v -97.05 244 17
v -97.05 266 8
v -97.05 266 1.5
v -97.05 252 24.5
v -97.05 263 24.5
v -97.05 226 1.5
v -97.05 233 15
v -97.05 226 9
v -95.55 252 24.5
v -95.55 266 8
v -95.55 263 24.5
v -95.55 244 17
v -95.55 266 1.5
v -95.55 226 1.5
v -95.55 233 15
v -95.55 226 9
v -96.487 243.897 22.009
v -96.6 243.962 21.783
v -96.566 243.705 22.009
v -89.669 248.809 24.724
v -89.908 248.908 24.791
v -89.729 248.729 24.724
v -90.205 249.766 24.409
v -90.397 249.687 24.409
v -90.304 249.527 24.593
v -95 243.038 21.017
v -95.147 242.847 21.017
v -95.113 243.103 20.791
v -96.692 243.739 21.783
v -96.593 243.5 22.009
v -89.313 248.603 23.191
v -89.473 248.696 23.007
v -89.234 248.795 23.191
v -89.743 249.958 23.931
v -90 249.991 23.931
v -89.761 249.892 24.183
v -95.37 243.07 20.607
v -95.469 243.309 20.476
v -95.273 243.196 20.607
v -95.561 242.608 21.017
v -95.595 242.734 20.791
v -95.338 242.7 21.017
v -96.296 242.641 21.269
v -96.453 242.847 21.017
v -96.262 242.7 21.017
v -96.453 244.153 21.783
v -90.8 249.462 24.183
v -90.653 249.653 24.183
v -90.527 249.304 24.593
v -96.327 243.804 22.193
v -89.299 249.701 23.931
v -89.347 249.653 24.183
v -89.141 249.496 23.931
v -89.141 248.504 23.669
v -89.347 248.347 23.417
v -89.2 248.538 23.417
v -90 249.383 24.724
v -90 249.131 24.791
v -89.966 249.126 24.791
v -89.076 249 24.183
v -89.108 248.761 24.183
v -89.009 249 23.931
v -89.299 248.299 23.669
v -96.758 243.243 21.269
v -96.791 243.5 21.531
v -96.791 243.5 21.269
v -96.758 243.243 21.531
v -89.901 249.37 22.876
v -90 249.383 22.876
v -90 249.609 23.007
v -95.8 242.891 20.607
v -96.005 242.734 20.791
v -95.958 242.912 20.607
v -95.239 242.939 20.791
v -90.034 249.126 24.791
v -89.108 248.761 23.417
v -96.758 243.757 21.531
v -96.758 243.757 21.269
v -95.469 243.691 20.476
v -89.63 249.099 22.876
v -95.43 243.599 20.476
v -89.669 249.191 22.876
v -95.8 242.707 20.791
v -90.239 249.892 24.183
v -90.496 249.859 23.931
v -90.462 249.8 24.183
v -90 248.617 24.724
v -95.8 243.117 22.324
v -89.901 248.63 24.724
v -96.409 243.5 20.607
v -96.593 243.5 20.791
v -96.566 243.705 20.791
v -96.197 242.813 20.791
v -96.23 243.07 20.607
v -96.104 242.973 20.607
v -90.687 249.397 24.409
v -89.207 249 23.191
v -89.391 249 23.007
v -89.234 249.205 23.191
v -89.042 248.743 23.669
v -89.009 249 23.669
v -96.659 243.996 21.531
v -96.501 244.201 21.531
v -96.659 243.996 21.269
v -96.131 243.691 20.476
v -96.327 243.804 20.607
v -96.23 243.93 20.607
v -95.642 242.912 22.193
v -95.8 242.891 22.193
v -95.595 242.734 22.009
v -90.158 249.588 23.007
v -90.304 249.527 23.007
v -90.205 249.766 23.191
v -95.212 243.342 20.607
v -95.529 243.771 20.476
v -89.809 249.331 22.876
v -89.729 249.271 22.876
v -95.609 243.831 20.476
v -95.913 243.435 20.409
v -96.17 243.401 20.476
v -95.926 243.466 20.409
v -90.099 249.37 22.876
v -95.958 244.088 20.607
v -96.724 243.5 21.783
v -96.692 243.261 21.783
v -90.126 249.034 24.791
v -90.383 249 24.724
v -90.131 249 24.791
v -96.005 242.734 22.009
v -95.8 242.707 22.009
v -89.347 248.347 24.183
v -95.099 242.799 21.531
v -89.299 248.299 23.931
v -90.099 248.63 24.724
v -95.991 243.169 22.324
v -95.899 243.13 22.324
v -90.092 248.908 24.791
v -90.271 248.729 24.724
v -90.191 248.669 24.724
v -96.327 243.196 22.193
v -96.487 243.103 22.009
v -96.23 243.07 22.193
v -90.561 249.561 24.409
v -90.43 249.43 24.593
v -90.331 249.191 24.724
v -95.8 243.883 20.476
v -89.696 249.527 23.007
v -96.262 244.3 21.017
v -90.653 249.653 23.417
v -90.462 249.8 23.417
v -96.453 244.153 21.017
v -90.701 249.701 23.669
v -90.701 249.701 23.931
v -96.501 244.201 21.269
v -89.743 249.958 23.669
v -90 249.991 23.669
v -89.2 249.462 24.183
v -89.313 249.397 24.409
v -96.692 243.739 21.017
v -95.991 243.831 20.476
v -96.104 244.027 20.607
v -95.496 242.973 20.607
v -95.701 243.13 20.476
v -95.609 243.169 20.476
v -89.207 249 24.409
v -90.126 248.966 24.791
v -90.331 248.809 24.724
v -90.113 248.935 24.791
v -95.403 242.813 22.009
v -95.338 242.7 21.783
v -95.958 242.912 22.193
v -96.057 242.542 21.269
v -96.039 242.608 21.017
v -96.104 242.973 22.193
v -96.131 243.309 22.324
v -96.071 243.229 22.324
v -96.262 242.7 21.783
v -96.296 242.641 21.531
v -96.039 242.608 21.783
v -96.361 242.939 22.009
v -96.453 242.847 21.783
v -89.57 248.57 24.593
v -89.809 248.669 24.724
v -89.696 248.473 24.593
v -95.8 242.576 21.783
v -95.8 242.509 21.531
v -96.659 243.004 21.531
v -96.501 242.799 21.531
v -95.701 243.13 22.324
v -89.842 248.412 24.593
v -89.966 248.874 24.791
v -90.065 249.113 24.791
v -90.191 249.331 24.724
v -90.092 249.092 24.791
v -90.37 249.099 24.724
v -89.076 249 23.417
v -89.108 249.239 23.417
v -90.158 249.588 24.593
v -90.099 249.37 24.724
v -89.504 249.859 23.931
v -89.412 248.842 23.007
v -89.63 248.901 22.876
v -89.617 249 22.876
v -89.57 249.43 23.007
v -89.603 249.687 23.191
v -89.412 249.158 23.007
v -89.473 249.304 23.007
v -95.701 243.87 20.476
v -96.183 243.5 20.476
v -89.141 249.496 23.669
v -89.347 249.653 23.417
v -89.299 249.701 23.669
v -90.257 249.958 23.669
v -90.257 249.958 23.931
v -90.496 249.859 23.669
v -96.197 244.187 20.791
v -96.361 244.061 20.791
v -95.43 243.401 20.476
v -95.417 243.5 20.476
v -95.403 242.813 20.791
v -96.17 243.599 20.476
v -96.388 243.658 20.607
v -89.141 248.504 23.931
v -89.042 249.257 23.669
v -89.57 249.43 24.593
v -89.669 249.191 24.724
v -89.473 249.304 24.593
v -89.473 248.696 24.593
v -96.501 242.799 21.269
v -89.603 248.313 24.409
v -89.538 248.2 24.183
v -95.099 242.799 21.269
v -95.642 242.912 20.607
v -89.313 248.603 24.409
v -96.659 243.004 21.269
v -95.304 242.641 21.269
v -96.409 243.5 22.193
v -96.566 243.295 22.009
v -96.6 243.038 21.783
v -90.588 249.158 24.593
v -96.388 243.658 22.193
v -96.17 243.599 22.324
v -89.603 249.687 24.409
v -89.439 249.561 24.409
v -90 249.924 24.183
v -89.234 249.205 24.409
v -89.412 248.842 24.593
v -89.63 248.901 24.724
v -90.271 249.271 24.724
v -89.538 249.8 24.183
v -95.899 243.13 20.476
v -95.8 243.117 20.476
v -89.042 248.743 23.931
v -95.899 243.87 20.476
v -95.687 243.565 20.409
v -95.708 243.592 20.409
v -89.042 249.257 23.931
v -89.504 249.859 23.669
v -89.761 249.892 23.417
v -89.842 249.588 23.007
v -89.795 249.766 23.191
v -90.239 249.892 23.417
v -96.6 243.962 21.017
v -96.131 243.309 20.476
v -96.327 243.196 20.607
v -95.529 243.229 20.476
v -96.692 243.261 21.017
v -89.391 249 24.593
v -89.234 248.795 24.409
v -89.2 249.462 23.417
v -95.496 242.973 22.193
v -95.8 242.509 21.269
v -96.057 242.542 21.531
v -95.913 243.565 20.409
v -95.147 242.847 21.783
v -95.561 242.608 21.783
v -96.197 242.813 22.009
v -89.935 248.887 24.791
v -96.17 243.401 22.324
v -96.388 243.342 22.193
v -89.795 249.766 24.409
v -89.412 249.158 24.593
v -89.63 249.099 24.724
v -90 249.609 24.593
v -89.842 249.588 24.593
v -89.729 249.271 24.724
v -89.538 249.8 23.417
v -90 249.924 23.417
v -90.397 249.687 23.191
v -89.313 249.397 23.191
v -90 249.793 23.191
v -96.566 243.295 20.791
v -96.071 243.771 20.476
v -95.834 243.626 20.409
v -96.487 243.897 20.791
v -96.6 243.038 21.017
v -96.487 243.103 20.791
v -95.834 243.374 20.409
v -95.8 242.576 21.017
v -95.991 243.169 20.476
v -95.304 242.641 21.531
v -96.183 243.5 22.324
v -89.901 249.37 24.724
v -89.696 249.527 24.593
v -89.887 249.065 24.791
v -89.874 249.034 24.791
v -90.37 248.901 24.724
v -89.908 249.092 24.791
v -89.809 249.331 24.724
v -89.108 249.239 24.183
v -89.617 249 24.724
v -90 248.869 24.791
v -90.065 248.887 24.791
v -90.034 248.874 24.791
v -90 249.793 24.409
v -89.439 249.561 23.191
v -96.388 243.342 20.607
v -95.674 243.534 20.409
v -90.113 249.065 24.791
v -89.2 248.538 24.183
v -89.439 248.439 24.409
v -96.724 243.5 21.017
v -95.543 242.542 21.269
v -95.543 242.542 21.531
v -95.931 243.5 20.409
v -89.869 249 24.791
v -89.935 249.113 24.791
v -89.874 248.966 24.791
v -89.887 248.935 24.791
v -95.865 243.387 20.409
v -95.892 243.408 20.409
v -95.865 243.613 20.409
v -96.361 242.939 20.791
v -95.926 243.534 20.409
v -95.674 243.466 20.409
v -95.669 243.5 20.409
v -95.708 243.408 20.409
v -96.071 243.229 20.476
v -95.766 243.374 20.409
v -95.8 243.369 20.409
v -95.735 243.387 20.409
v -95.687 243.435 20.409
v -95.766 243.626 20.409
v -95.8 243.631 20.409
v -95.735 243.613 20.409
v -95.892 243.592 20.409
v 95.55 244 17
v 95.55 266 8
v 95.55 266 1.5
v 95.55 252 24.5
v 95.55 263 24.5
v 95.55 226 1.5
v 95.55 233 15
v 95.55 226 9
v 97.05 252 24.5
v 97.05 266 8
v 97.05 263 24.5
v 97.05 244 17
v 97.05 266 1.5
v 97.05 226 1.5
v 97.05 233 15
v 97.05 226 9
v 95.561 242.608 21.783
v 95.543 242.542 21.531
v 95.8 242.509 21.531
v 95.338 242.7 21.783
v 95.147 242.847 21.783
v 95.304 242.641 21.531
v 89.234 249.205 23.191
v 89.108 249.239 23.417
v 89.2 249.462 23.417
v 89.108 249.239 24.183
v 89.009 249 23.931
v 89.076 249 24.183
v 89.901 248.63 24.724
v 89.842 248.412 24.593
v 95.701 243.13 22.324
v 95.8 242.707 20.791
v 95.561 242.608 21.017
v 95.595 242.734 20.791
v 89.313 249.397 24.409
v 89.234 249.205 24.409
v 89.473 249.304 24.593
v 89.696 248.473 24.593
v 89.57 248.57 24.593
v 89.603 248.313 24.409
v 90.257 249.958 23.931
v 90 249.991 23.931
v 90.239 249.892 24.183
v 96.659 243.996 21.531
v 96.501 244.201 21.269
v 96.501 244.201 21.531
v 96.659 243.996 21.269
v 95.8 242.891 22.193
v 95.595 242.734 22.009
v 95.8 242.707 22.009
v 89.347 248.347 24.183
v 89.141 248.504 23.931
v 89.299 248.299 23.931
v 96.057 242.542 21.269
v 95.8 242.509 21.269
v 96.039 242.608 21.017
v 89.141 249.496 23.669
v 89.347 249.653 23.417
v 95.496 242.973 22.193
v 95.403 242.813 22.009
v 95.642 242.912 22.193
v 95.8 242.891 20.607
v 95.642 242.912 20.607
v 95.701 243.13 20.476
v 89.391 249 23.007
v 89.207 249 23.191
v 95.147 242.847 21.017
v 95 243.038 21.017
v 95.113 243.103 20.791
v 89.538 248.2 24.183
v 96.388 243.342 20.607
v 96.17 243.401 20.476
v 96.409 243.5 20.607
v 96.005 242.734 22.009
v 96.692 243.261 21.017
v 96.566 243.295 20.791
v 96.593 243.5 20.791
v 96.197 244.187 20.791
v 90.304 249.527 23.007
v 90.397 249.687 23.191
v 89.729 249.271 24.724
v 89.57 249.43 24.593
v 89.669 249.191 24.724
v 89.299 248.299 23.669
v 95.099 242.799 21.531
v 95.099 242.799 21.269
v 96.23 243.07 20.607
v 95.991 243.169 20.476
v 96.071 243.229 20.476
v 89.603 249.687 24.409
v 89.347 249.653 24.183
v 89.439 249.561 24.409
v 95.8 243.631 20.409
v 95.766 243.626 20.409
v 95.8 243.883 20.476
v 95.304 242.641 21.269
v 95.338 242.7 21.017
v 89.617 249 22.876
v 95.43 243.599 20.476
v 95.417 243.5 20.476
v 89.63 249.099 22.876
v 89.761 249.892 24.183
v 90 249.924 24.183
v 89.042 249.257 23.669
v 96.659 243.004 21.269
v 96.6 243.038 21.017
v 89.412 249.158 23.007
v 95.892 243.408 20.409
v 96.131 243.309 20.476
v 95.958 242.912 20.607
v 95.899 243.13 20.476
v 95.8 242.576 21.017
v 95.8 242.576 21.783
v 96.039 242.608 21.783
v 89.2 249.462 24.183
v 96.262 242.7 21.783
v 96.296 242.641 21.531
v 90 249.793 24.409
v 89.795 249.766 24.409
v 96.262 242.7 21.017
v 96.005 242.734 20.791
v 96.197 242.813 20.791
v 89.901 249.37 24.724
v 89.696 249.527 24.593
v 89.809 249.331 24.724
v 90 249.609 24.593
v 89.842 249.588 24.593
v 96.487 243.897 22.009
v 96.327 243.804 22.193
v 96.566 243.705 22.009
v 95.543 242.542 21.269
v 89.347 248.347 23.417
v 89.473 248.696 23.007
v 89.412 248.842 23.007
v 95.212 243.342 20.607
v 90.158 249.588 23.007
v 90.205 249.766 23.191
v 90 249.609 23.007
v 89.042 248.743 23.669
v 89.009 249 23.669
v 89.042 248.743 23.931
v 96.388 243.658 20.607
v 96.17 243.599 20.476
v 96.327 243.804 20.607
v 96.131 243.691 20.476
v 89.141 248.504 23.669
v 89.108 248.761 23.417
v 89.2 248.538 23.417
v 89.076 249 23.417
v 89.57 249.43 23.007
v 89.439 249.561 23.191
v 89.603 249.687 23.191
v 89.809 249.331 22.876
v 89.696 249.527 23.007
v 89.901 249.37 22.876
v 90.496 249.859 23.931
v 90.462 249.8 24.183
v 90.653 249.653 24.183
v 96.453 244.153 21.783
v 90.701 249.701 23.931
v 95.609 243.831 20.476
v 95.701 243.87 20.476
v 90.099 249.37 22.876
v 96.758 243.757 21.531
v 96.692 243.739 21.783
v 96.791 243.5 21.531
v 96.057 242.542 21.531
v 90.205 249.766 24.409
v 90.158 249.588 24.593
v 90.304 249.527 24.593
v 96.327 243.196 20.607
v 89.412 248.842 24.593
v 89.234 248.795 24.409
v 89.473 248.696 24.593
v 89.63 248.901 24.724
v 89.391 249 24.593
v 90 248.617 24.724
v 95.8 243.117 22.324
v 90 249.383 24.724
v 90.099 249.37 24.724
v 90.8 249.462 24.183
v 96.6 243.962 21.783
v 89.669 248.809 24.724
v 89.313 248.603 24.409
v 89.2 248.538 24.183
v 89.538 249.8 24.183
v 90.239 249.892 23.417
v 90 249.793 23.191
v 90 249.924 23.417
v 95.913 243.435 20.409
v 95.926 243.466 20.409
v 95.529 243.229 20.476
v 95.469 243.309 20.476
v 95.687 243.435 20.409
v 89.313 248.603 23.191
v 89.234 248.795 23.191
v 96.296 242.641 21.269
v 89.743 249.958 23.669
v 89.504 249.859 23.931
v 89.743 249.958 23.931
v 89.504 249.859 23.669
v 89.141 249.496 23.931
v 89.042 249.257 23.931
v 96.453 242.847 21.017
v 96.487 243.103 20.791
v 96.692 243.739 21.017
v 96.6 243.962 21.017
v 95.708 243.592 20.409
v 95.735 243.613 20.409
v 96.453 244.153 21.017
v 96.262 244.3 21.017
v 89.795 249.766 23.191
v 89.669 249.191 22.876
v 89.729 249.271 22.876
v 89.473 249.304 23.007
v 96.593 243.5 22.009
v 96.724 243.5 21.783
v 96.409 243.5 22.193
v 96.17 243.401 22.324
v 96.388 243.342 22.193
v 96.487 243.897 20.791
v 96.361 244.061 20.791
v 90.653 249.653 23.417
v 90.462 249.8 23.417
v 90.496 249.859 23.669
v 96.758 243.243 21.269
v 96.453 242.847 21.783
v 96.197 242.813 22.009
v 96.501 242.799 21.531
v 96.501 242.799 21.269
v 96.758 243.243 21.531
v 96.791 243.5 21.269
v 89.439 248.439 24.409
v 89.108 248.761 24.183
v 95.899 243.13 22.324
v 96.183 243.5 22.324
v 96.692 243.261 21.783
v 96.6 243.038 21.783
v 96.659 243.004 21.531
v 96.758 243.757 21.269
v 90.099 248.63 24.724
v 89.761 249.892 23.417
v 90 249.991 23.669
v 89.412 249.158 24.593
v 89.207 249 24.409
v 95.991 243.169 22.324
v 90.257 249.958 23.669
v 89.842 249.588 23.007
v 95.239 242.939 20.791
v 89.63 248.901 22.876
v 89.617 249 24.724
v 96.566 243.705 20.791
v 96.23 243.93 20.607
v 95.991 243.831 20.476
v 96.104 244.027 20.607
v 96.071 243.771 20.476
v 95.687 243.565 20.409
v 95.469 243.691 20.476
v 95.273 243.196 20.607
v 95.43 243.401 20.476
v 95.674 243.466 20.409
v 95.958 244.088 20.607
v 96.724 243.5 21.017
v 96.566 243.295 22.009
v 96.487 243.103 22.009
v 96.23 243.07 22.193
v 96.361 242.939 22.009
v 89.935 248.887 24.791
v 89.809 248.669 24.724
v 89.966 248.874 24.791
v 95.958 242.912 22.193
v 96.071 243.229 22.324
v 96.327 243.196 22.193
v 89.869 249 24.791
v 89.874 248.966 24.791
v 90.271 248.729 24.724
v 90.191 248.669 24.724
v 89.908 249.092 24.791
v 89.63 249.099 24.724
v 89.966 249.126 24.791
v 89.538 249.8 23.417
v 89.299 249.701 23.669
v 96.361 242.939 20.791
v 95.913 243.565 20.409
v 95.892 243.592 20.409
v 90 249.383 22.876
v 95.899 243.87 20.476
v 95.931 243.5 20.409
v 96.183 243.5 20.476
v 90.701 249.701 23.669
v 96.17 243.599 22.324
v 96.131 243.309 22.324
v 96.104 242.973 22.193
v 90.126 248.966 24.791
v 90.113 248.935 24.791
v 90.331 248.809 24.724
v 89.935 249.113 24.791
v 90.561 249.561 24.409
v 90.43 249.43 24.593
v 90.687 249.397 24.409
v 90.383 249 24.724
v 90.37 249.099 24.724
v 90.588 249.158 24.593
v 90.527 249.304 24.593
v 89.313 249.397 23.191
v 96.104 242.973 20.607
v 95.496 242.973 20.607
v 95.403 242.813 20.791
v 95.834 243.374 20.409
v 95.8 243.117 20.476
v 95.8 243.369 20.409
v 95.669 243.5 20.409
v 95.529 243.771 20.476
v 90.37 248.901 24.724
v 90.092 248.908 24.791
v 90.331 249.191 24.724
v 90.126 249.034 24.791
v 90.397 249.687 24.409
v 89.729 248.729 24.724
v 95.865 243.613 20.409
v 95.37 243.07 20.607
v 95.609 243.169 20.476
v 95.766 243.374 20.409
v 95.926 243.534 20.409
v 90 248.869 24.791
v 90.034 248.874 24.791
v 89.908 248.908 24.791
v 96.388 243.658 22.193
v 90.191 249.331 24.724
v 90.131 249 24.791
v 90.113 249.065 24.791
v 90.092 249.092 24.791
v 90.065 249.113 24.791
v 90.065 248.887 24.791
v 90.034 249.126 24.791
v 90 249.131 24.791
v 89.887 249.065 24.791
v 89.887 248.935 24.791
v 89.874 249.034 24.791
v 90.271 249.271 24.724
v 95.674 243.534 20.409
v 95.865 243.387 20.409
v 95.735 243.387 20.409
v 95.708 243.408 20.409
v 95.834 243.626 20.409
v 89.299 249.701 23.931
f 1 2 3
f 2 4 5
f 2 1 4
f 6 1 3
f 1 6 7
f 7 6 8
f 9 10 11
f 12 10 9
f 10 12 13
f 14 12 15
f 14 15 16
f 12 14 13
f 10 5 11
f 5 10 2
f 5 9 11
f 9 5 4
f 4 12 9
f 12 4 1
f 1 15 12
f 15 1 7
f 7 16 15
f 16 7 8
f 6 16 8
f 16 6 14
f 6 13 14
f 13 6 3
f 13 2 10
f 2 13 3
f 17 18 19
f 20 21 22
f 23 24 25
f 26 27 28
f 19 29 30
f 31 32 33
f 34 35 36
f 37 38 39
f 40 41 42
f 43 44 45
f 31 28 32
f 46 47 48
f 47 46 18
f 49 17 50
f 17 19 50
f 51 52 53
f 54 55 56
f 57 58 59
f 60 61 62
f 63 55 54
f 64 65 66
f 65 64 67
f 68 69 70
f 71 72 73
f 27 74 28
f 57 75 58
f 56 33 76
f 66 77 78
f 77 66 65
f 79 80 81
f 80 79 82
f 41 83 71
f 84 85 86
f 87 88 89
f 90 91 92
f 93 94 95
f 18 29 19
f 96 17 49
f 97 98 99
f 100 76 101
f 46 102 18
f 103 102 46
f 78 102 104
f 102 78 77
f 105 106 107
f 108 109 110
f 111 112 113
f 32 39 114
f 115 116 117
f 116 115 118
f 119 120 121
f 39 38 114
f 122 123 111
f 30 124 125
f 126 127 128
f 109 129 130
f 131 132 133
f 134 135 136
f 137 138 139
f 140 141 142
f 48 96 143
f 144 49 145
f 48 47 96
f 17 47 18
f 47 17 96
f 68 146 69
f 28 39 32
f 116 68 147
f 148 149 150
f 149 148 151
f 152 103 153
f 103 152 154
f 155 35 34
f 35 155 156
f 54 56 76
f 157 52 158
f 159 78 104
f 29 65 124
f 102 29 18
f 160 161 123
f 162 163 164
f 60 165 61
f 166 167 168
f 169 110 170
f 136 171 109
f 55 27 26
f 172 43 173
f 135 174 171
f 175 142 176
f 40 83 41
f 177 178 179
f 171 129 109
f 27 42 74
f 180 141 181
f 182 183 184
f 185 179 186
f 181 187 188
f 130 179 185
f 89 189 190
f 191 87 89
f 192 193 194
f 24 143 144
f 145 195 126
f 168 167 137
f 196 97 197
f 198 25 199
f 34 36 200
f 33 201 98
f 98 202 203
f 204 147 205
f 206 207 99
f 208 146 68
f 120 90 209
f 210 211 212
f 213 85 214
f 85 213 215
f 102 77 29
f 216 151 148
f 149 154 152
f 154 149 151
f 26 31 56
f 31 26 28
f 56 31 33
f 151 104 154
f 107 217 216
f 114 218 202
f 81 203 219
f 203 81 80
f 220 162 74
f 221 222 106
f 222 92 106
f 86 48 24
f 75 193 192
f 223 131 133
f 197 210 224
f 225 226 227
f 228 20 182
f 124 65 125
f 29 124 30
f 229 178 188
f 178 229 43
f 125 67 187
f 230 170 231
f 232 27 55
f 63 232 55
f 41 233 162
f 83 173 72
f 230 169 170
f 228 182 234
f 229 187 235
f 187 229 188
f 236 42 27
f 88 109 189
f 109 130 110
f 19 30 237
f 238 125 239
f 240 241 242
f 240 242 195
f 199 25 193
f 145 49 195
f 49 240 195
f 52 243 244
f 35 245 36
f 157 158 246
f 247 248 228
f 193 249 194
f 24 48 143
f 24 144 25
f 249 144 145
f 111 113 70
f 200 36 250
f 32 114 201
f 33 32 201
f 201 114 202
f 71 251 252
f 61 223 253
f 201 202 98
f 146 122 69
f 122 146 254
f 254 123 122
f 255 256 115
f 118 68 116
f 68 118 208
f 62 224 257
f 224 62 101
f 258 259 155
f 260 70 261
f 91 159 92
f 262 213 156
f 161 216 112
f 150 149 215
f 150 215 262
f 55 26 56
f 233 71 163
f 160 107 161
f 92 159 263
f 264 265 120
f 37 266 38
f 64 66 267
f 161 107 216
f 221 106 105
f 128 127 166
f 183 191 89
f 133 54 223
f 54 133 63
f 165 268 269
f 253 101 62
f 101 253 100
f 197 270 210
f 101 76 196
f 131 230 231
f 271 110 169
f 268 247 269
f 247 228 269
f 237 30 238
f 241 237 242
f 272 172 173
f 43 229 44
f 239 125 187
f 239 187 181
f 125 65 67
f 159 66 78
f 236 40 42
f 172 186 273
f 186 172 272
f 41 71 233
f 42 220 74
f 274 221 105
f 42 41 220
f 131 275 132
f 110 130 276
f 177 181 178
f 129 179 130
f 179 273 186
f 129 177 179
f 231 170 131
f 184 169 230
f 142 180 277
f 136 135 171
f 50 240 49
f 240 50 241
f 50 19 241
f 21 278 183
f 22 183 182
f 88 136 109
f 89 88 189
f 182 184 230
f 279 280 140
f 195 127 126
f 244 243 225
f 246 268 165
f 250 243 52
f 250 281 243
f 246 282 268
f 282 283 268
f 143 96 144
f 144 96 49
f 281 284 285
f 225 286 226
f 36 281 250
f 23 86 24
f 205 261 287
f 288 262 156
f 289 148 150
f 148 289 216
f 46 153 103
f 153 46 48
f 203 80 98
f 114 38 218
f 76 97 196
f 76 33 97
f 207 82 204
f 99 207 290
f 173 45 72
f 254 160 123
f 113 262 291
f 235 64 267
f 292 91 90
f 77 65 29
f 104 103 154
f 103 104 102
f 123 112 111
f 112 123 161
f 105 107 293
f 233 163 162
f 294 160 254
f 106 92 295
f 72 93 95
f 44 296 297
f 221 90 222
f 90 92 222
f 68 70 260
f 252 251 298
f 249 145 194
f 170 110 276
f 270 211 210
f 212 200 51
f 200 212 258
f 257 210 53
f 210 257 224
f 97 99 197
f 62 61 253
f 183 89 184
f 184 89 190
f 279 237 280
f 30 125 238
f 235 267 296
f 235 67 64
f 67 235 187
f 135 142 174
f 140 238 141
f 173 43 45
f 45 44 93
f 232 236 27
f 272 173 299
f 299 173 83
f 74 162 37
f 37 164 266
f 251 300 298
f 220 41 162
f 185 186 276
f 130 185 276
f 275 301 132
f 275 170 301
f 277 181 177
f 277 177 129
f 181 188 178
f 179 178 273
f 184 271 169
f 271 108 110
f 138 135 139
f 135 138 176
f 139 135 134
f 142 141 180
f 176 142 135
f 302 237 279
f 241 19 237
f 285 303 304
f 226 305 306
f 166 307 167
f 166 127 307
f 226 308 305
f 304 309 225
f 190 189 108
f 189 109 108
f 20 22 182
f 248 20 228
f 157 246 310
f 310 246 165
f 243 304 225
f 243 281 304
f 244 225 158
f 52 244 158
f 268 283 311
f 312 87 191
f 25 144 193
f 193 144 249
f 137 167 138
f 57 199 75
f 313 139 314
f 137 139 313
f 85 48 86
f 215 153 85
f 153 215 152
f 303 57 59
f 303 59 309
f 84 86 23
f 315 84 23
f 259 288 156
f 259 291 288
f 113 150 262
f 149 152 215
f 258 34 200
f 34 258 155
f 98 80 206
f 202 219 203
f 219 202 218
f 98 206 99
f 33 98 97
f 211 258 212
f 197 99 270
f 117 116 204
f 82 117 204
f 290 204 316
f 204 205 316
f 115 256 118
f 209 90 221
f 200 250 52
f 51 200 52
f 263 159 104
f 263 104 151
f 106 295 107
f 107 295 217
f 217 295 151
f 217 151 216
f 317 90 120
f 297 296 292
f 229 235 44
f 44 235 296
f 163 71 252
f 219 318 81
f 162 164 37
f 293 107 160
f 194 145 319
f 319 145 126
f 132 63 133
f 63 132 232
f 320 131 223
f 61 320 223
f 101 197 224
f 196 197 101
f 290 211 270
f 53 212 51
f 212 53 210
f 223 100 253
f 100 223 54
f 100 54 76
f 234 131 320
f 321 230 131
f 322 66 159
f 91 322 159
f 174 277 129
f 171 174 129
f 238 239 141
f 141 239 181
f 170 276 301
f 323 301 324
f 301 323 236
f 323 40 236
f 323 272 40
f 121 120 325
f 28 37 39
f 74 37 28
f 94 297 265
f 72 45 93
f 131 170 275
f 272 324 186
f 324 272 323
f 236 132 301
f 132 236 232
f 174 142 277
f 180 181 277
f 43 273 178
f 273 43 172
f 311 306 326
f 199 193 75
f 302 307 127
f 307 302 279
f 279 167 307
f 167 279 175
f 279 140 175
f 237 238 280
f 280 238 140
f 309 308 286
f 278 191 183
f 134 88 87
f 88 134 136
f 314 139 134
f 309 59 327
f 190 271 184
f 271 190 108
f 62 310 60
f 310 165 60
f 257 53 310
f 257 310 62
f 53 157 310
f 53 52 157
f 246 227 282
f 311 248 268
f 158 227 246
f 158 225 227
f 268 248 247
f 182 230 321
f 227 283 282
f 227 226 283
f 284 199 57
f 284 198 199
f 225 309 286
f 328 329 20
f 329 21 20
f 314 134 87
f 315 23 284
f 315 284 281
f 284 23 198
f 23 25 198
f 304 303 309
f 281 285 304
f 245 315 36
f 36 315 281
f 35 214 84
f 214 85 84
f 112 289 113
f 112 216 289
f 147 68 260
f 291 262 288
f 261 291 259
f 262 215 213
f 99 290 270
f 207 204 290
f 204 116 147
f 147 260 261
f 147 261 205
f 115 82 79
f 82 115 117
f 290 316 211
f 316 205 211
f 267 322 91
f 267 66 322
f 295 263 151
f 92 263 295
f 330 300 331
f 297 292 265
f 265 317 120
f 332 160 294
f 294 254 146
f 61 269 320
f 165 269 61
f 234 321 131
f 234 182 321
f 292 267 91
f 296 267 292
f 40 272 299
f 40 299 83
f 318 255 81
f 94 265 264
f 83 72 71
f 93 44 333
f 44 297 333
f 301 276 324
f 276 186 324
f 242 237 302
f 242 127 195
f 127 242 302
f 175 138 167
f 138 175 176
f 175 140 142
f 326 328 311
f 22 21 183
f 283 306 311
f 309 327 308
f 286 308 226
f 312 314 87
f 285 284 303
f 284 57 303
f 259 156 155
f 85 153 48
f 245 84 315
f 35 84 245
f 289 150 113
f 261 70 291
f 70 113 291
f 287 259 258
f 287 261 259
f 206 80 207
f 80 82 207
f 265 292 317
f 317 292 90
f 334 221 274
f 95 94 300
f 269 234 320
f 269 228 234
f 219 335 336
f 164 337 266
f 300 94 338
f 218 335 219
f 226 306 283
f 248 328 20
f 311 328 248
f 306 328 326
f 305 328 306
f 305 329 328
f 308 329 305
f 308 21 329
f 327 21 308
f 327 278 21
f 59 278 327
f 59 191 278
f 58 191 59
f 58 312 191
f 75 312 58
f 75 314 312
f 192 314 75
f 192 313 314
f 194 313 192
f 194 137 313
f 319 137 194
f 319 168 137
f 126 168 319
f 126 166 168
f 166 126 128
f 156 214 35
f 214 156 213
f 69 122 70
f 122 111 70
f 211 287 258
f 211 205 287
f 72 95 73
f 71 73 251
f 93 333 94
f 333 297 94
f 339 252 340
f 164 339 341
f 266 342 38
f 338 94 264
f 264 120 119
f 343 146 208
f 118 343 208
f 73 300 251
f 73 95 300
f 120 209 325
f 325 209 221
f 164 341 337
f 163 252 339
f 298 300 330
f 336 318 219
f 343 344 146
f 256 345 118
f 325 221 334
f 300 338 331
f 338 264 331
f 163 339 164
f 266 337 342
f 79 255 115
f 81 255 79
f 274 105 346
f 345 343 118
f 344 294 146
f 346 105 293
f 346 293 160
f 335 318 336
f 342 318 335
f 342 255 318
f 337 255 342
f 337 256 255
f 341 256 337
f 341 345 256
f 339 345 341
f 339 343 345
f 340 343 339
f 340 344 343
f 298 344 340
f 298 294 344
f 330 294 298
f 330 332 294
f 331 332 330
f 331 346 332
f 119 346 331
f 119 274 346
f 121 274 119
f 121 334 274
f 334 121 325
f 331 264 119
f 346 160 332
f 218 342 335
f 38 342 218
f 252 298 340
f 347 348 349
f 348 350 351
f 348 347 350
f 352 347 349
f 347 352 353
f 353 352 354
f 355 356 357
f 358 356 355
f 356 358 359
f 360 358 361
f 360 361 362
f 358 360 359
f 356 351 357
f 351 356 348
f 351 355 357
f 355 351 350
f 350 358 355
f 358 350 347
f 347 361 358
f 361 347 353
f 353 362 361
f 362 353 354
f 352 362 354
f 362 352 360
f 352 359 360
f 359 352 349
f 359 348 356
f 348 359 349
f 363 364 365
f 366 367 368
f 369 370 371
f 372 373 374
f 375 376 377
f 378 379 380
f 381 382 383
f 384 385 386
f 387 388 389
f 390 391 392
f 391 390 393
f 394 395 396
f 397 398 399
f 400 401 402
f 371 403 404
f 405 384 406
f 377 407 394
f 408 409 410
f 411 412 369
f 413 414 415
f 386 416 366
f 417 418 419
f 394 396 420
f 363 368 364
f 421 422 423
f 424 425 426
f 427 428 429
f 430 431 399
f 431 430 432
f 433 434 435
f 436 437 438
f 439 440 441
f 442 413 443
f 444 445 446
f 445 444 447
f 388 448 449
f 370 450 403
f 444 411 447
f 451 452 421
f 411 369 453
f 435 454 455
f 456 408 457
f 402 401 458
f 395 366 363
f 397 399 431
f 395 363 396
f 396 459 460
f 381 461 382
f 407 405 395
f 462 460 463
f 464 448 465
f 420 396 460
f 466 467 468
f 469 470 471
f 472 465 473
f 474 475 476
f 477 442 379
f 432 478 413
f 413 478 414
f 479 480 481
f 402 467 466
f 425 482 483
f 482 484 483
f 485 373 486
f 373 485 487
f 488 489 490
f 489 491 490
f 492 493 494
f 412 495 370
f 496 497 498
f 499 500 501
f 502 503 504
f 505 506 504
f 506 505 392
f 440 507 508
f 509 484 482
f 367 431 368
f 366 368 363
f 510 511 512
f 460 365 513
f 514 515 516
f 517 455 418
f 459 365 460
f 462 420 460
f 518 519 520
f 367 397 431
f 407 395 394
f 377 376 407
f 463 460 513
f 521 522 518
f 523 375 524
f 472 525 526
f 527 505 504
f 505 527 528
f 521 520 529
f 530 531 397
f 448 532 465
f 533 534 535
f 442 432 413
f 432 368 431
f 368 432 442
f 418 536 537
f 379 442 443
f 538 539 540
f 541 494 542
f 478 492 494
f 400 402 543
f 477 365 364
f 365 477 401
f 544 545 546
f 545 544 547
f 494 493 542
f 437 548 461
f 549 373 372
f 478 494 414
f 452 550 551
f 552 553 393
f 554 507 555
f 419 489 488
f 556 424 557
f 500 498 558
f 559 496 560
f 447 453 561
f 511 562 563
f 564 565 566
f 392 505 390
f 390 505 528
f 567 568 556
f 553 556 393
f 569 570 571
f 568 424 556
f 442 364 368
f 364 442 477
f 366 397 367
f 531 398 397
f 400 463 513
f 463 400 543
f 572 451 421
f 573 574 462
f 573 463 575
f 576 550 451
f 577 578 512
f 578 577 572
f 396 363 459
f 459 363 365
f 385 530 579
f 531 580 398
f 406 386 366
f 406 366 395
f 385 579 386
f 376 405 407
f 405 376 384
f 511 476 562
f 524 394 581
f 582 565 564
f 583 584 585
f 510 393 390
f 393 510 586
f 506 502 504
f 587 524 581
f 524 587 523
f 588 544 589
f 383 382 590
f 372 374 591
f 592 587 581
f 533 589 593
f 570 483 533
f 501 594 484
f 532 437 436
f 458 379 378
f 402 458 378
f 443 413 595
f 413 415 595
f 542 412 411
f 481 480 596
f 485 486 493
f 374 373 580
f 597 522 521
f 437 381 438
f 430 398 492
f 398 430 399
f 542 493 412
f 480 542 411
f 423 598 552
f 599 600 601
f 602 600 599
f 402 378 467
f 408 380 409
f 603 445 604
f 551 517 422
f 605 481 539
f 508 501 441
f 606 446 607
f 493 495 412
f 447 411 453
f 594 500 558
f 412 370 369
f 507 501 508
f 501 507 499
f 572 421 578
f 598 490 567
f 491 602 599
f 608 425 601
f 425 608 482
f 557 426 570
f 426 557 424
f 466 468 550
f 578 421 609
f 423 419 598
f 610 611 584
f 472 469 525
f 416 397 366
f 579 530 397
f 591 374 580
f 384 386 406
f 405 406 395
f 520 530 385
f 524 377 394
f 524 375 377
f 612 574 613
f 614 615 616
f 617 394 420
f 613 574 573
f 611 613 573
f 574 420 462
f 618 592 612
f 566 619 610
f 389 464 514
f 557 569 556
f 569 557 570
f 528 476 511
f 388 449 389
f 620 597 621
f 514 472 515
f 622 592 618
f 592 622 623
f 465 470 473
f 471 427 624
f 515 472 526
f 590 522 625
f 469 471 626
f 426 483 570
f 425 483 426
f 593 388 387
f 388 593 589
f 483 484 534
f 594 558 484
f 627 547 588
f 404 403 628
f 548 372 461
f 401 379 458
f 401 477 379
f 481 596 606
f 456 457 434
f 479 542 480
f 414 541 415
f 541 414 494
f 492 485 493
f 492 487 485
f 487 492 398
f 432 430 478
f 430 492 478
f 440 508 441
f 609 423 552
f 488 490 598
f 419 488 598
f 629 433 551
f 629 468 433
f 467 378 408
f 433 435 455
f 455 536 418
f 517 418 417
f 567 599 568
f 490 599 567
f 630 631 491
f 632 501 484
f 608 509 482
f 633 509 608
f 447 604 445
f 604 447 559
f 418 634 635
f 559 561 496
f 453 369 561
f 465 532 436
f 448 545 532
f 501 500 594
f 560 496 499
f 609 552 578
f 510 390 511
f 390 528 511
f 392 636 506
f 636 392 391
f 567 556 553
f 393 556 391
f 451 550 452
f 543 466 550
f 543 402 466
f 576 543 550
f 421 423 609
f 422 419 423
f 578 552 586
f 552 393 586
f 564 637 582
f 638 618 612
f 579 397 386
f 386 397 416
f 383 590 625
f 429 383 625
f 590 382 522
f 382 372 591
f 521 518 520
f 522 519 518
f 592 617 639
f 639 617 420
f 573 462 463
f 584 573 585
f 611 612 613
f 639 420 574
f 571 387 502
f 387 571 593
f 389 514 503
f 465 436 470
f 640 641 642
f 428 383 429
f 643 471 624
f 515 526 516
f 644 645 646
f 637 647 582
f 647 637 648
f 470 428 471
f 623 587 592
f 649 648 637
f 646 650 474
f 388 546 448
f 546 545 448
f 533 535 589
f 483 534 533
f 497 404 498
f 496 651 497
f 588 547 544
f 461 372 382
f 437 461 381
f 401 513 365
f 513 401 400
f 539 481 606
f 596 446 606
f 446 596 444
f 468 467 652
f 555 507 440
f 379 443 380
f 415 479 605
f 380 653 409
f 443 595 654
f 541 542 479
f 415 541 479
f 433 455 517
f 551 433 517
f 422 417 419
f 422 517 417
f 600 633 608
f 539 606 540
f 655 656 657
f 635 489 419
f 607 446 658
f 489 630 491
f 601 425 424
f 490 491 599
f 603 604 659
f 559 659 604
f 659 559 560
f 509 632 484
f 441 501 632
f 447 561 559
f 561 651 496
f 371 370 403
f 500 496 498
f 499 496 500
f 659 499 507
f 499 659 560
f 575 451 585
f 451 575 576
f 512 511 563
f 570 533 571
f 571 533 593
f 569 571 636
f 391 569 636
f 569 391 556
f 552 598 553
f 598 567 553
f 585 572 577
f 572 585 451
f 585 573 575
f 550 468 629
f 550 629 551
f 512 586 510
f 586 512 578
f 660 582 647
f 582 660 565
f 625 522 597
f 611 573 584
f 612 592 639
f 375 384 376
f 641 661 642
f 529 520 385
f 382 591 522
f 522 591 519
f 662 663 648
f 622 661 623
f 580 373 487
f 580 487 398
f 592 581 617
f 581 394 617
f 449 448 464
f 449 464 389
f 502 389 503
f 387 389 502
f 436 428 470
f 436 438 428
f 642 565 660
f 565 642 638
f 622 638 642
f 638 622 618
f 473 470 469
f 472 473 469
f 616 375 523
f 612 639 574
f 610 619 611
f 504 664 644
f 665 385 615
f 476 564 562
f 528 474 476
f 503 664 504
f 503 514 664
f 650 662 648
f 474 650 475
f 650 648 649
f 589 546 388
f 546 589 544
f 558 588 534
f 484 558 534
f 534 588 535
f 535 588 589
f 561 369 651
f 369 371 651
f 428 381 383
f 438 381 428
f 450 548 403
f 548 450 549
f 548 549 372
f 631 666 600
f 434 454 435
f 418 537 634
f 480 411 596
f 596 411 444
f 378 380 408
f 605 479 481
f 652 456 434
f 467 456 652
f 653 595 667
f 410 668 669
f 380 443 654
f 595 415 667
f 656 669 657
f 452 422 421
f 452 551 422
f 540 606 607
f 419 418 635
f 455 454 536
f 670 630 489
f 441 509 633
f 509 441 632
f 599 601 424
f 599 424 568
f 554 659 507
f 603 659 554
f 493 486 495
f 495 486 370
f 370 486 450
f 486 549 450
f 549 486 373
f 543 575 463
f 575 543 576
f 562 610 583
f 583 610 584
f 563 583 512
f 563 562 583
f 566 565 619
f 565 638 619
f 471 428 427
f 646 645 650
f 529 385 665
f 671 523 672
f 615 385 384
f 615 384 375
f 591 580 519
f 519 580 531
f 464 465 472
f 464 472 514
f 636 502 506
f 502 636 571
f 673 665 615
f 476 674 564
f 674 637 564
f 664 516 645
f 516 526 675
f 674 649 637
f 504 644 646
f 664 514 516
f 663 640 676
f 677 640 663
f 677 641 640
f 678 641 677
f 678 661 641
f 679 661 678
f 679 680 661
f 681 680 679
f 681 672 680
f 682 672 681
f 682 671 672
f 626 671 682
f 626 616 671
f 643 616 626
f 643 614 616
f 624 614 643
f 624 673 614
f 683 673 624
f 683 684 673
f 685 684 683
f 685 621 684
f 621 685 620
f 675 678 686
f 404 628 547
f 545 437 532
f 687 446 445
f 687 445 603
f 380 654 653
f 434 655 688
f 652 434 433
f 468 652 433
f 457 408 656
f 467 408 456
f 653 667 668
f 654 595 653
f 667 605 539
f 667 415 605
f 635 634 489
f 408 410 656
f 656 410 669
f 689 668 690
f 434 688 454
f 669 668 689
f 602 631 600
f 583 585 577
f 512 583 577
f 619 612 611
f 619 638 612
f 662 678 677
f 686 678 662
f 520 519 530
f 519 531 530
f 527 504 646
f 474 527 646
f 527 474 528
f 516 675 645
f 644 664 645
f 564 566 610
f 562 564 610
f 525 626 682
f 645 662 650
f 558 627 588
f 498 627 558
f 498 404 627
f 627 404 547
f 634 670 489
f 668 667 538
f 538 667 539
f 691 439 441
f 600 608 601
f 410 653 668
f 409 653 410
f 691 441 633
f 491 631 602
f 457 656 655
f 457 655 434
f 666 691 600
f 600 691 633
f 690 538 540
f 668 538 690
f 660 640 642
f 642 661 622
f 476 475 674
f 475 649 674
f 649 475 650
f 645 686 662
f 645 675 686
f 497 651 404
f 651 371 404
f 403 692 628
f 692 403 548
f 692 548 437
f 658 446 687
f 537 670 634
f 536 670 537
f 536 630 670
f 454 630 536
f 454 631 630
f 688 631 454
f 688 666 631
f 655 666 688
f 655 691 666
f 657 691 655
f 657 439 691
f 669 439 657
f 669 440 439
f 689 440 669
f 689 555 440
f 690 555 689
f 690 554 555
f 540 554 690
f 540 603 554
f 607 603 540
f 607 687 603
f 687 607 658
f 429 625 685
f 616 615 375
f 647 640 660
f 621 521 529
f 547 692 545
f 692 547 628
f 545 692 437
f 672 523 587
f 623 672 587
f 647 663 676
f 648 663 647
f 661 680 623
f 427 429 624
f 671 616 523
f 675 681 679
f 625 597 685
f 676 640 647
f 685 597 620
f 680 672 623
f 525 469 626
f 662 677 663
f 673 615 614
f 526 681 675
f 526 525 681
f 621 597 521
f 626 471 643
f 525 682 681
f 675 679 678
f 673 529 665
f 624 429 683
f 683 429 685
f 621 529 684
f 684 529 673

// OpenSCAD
// file: ../lib.scad
// ===== 공용 프리미티브 (params 의존 없음 — use로 포함. 함정 1) =====

// 두 점을 잇는 캡슐. 끝단이 od/2 만큼 뻗는다 (함정 3)
module rod(p1, p2, od, fn = 56)
    hull() { translate(p1) sphere(d = od, $fn = fn);
             translate(p2) sphere(d = od, $fn = fn); }

function mir(p, s = 1) = [s * p.x, p.y, p.z];

// --- 라운디드 사각 2D 폴리곤 (CCW) ---
function arc_pt(cx, cy, r, a) = [cx + r * cos(a), cy + r * sin(a)];
function rrpts(w, h, r, n = 4) =
    let (x = w / 2 - r, y = h / 2 - r)
    concat(
        [for (i = [0:n]) arc_pt( x, -y, r, -90 + 90 * i / n)],
        [for (i = [0:n]) arc_pt( x,  y, r,   0 + 90 * i / n)],
        [for (i = [0:n]) arc_pt(-x,  y, r,  90 + 90 * i / n)],
        [for (i = [0:n]) arc_pt(-x, -y, r, 180 + 90 * i / n)]);

// y 위치의 XZ 단면 슬래브 (중심 x0/zc, 폭 w/높이 h, 모서리 r).
// 회전 매핑: 2D x→차량 X, 2D y→차량 Z, 돌출 +z→−Y (y..y+0.02 전방 전용, 함정 20)
module slabr(y, x0, w, h, zc, r)
    translate([x0, y + 0.02, zc]) rotate([90, 0, 0])
        linear_extrude(0.02) polygon(rrpts(w, h, r));

// 단면 체인 loft: sec = [[y, x0, w, h, zc, r], ...]
module loftr(sec)
    for (i = [0 : len(sec) - 2])
        hull() {
            slabr(sec[i][0],     sec[i][1],     sec[i][2],     sec[i][3],     sec[i][4],     sec[i][5]);
            slabr(sec[i + 1][0], sec[i + 1][1], sec[i + 1][2], sec[i + 1][3], sec[i + 1][4], sec[i + 1][5]);
        }

// 라운디드 박스 (z0..z1 수직, 평면 모서리 r)
module rbox(xc, yc, z0, z1, dx, dy, r, fn = 32)
    hull() for (px = [-1, 1], py = [-1, 1])
        translate([xc + px * (dx / 2 - r), yc + py * (dy / 2 - r), z0])
            cylinder(r = r, h = z1 - z0, $fn = fn);

// --- NACA 계열 에어포일 (LE 원점, 2D +x = 현 방향) ---
function _yt(x, c, t) = 5 * t * c * (0.2969*sqrt(x) - 0.1260*x - 0.3516*x*x
    + 0.2843*x*x*x - 0.1036*x*x*x*x);
function _yc(x, c, m) = 4 * m * c * x * (1 - x);
function naca_pts(c, t, m, n = 12) =
    concat(
        [for (i = [0:n])     let (x = i / n)     [x*c,  _yt(x, c, t) + _yc(x, c, m)]],
        [for (i = [n-1:-1:0]) let (x = i / n)    [x*c, -_yt(x, c, t) + _yc(x, c, m)]]);

// 슬라이스 3D 링: v=[x, yle, zle, c, aoa, th, cam] → 받각 회전된 naca 점의 링
// (th/cam은 mm — 현 대비 비율로 정규화)
function wring(v, n = 12) =
    let (c = v[3], t = v[5] / c, m = v[6] / c, pts = naca_pts(c, t, m, n),
         ca = cos(v[4]), sa = sin(v[4]))
    // 코드 방향 (ca,sa) + 두께/캠버 수직 방향 (-sa,ca) — 2D y 누락 금지
    [for (p = pts) [v[0], v[1] + p[0] * ca - p[1] * sa, v[2] + p[0] * sa + p[1] * ca]];

// 진짜 로프트 윙 — polyhedron 스트립. hull 체인은 캠버진 하면을 볼록 껍질로
// 채워(LE→TE 직선 웨지) 요소가 처지므로 쓰지 않는다
module wing3(sl, n = 12) {
    rings = [for (v = sl) wring(v, n)];
    ns = len(rings);
    m = len(rings[0]);
    pts = [for (r = rings, p = r) p];
    function ix(i, k) = i * m + (k % m);
    faces = concat(
        // 측면 스트립 (사중면 → 삼각형 2) — 외향 노멀 권선(캡과 일치)
        [for (i = [0 : ns - 2], k = [0 : m - 1])
            each [[ix(i, k), ix(i, k + 1), ix(i + 1, k + 1)],
                  [ix(i, k), ix(i + 1, k + 1), ix(i + 1, k)]]],
        // 끝 캡 (링은 단순 폴리곤 — 팬 삼각분할)
        [for (k = [1 : m - 2]) [ix(0, 0), ix(0, k + 1), ix(0, k)]],
        [for (k = [1 : m - 2]) [ix(ns - 1, 0), ix(ns - 1, k), ix(ns - 1, k + 1)]]
    );
    polyhedron(points = pts, faces = faces, convexity = 4);
}

// 반쪽 슬라이스 → x-대칭 전체. 규약: half는 센터(x=0)→팁 순서(내림차순 x).
// 결과는 x 오름차순 체인. x=0 센터만 중복 제외 (그 외 전부 미러)
function wsym(half) =
    concat([for (i = [len(half) - 1 : -1 : 0]) half[i]],
           [for (i = [0 : len(half) - 1]) if (abs(half[i][0]) > 1e-9)
               concat([-half[i][0]], [for (j = [1 : len(half[i]) - 1]) half[i][j]])]);

// 환(링), 축 Z
module ann(r_in, r_out, h, fn = 96)
    difference() { cylinder(r = r_out, h = h, center = true, $fn = fn);
                   cylinder(r = r_in,  h = h + 2, center = true, $fn = fn); }

// 리스트 전체 x반전+순서 역행 (센터 구간 없는 플랩 등 — 좌우 별도 wing3 호출용).
// x반전만 하면 행렬식이 음수가 되어 권선이 뒤집힌다 → 순서 역행으로 상쇄
function msym(half) =
    [for (i = [len(half) - 1 : -1 : 0])
        concat([-half[i][0]], [for (j = [1 : len(half[i]) - 1]) half[i][j]])];
// file: ../params.scad
// =====================================================================
// F1 그랜드파이언스 카 1:10 — 전체 파라미터 (유일한 수정 지점)
// 좌표계: +Y 전방, +X 좌측, +Z 상방, 지면 z=0, 원점=휠베이스 중심
// 전장 558 (y -268..+278), 전폭 194, 휠베이스 360, 타이어 OD 72 (720mm)
// 30부품. loftr 단면 = [y, x0, w, h, zc, r] (XZ 단면, y..y+0.02 슬래브)
// wing3 슬라이스 = [x, yle, zle, c, aoa, th, cam]
//   aoa: 현 방향의 X축 회전각. 전방 받각 요소는 165~170 (TE가 뒤+위)
// =====================================================================
$fn = 96;

// -- 휠/액슬 (실차 720mm 타이어, 18인치 림, 트랙 F1600/R1550) --
AXF_Y = 180;   AXR_Y = -180;
WHF_X = 80;    WHR_X = 77.5;
WH_Z  = 36;
TIRF_W = 30.5; TIRR_W = 40.5;  TIR_R = 36;
TIR_FN = 288;                 // 타이어 회전체 해상도
RIM_R = 23.2;  RIM_T = 1.0;   // 림 배럴 반경/두께
RIM_LF = 12.4; RIM_LR = 17.4; // 림 배럴 반폭
HUB_BORE = 7.0; STUB_D = 6.2; // 방사 간극 0.4
DISC_R = 15.5;                // 브레이크 디스크

// -- 바디 공통 레벨 --
FLO_Z0 = 2.0;  FLO_Z1 = 5.5;  // 플로어 (두께 3.5)
BOD_Z0 = 5.65;                // 샤시/카버/기어박스 바닥 (플로어 위 0.15)
J = 0.15;                     // 부품 접합 기본 간극
ARM_OD = 3.4;                 // 서스펜션 암 캡슐 직경

// ===== 01 플로어 =====
FLOOR_SEC = [
    [132,    0,  92, 3.5, 3.75, 1.5], [100, 0, 118, 3.5, 3.75, 1.5],
    [60,     0, 130, 3.5, 3.75, 2.0], [10,  0, 132, 3.5, 3.75, 2.0],
    [-60,    0, 128, 3.5, 3.75, 2.0], [-120, 0, 112, 3.5, 3.75, 2.0],
    [-161.85, 0, 100, 3.5, 3.75, 2.0]];

// ===== 02 디퓨저 (램프 + 스트레이크는 부품 내부) =====
DIFF_SEC = [
    [-230,   0, 100, 10.0, 11.0, 1.5], [-215, 0, 100, 8.0,  9.0, 1.5],
    [-190,   0, 100,  6.0,  6.2, 1.5], [-162.0, 0, 100, 4.0, 4.15, 1.5]];
DIFF_TOP = [[-175, 7.8], [-205, 11.9], [-228, 15.6]];  // (y, 램프 상면 z)

// ===== 03 플로어 에지 윙 =====
FEW_SEC = [   // [y, x0, w, h, zc, r] — x0 부호로 좌우
    [55,   63.5, 3.0, 2.0, 6.65, 1.0], [-5,  65.5, 3.0, 5.5, 8.40, 1.5],
    [-70,  63.0, 3.0, 4.0, 7.65, 1.5], [-120, 58.0, 3.0, 3.0, 7.15, 1.5]];
FEW2_SEC = [
    [100, 57.0, 2.5, 1.5, 6.40, 0.8], [60, 60.0, 2.5, 2.0, 6.65, 0.8]];

// ===== 04 노우즈 =====
NOSE_SEC = [
    [95,   0, 38, 28, 25.3, 12], [100,  0, 38, 29, 25.3, 12],
    [115,  0, 36, 28, 23.8, 11], [135,  0, 31, 24, 21.3,  9],
    [160,  0, 27, 20, 18.3,  8], [185,  0, 23, 17, 15.8,  7],
    [205,  0, 20, 15, 14.3,  6], [224,  0, 17, 12, 12.3,  5],
    [242,  0, 14,  9, 10.8,  4], [258,  0, 10,  7, 10.1,  3],
    [272,  0,  4.5, 4.5, 9.8, 2], [273.5, 0, 1.2, 1.2, 9.8, 0.6]];

// ===== 05 샤시(모노코크) + 콕핏 컷 =====
CHAS_SEC = [
    [-34.85, 0, 46, 44, 27.65, 15], [-10, 0, 48, 46, 28.65, 15],
    [20,     0, 48, 44, 27.65, 15], [60,  0, 46, 40, 25.65, 14],
    [94.85,  0, 42, 34, 22.65, 12]];
CKP_CUT = [[62, 0, 34, 32, 46, 3], [-30, 0, 34, 30, 45, 3]];

// ===== 06 엔진 커버 + 샤크핀 =====
COV_SEC = [
    [-152,   0,  8, 14, 35.65,  6], [-140, 0, 12, 18, 32.65,  7],
    [-120,   0, 18, 24, 29.65,  9], [-95,  0, 26, 30, 26.15, 11],
    [-70,    0, 34, 36, 25.65, 13], [-50,  0, 40, 40, 25.65, 14],
    [-35.15, 0, 44, 42, 26.65, 15]];
FIN_SEC = [
    [-162, 0, 2.2, 44, 62.0, 1], [-120, 0, 2.5, 30, 56.0, 1],
    [-92.2, 0, 2.5, 10, 45.0, 1]];

// ===== 07 에어박스 (험프 + 인테이크 링) =====
ABX_SEC = [
    [-92, 0, 14, 17, 50.00, 6], [-68, 0, 20, 24, 56.60, 8],
    [-46, 0, 22, 26, 59.60, 8], [-34, 0, 22, 13, 56.30, 6]];
ABX_RING_C = [0, -45, 73.5];  ABX_RING_R = 11;  ABX_RING_T = 4.5;
ABX_RING_SZ = 0.72;

// ===== 08 사이드포드 (x0=±41.5) =====
SPOD_X0 = 41.5;
SPOD_SEC = [   // [y, w, h, zc, r]
    [38,   34, 26, 18.65, 8], [5,   34, 28, 19.65, 9], [-25,  34, 26, 18.65, 9],
    [-55,  32, 21, 18.15, 8], [-80, 30, 15, 17.15, 8], [-100, 26,  9, 16.15, 7]];
SPOD_INLET = [24, 18, 19, 2.3];  // 컷: w, h, zc, 깊이

// ===== 09 할로 =====
HALO_N = 28;  HALO_OD = 9;
HALO_RX = 22; HALO_RY = 44; HALO_CY = 12;  // 타원 계획면(평면도)
HALO_Z0 = 75; HALO_ZA = 2;                 // z(t) = Z0 + ZA*cos(t)

// ===== 10/11/12/13 프런트 윙 =====
FW_MAIN_HALF = [   // 반쪽(x≤0) — wsym()로 전체화
    [0,    258.3, 2.4, 20, 170, 1.4, 2.0],
    [-16,  259.0, 3.4, 27, 165, 1.6, 2.4],
    [-40,  260.0, 3.6, 40, 166, 1.8, 2.8],
    [-60,  257.0, 4.0, 37, 167, 1.7, 2.6],
    [-80,  258.0, 4.4, 31, 166, 1.6, 2.2],
    [-95.2, 263.0, 4.6, 26, 166, 1.5, 1.8]];
FW_F1_HALF = [
    [-16,  253.0, 8.0, 22, 155, 1.3, 4.0],
    [-40,  250.5, 8.2, 26, 156, 1.4, 4.2],
    [-60,  249.5, 8.4, 26, 157, 1.4, 4.2],
    [-80,  250.0, 8.6, 24, 158, 1.4, 4.0],
    [-95.2, 254.0, 8.8, 21, 158, 1.3, 3.5]];
FW_F2_HALF = [
    [-16,  258.0, 12.4, 17, 147, 1.2, 4.5],
    [-40,  255.5, 12.6, 20, 148, 1.3, 4.8],
    [-60,  254.5, 12.8, 20, 149, 1.3, 4.8],
    [-80,  254.5, 13.0, 19, 150, 1.3, 4.5],
    [-95.2, 258.0, 13.2, 17, 150, 1.2, 4.0]];
FW_EP_X = 96.3;  FW_EP_T = 1.5;   // 엔드플레이트 x 중심/두께
FW_EP_PTS = [    // (y,z) 아웃라인
    [226, 1.5], [266, 1.5], [266, 8], [263, 24.5], [252, 24.5],
    [244, 17], [233, 15], [226, 9]];
FW_MT_SEC = [   // 마운트 플레이트 [y, x0(±2.6), w, h, zc, r] — 노우즈 저면 라운딩 회피
    [244, 2.6, 1.6, 1.8, 5.25, 0.5], [250, 2.6, 1.6, 1.8, 5.25, 0.5]];

// ===== 14 리어 윙 =====
RW_MAIN = [
    [-50.8, -212, 57.5, 46, 162, 2.2, -3.5], [-25, -211, 56.6, 47, 162, 2.3, -4.0],
    [0,     -210, 54.2, 47, 162, 2.3, -4.0], [25,  -211, 56.6, 47, 162, 2.3, -4.0],
    [50.8,  -212, 57.5, 46, 162, 2.2, -3.5]];
RW_FLAP = [
    [-49.6, -234,   71.8, 30, 155, 1.8, -4.5],
    [0,     -235.5, 73.0, 30, 155, 1.8, -4.5],
    [49.6,  -234,   71.8, 30, 155, 1.8, -4.5]];
RW_EP_X = 52;  RW_EP_T = 2;
RW_EP_PTS = [
    [-200, 46], [-268, 46], [-268, 60], [-262, 93], [-250, 93],
    [-243, 72], [-218, 64], [-202, 74]];
RW_DRS = [-245, 79.4, 5.0, 2.6, 3.0];   // 팟: y, z, w, h, 두께

// ===== 15 빔 윙 =====
BEAM_E1 = [
    [-50.9, -204.5, 31.5, 16, 162, 1.8, -2.5], [0, -205.5, 30.4, 16, 162, 1.8, -2.5],
    [50.9,  -204.5, 31.5, 16, 162, 1.8, -2.5]];
BEAM_E2 = [
    [-50.9, -210, 36.8, 15, 158, 1.6, -3.0], [0, -211, 35.6, 15, 158, 1.6, -3.0],
    [50.9,  -210, 36.8, 15, 158, 1.6, -3.0]];
BEAM_PLATE = [-214, -200.15, 8.2, 22, 31];  // 마운트 플레이트 y1,y0,x반폭,z0,z1

// ===== 16 리어윙 파일론(쌍둥 스완넥) =====
RW_PYL = [[-158, 55.0], [-190, 58.0], [-212.5, 63.0]];  // (y, z), x=±5.4
RW_PYL_X = 5.4;  RW_PYL_OD = 8;

// ===== 17 미러 =====
MIR_BASE = [14, 63, 46.0];  MIR_HOUSE = [31, 66, 56.5];

// ===== 18 헬멧 =====
HELM_C = [0, 0, 55];  HELM_R = 11.5;
HELM_SC = [1, 1.18, 1.02];

// ===== 19 콕핏 트림 =====
SEAT_SEC  = [[30, 0, 26, 13.2, 36.75, 3], [-10, 0, 26, 13.2, 36.75, 3]];
HREST_SEC = [[12, 0, 32, 15, 53.5, 5], [-20, 0, 32, 15, 53.5, 5]];

// ===== 20 스티어링 휠 =====
SW_C = [0, 40, 47];  SW_TILT = 20;

// ===== 21/22 서스펜션 (픽업=[x, y, z], 암 끝은 업라이트 내부) =====
FUP = [61, 183, 46];  FLO_BALL = [61.5, 181, 24];  FTR = [61.5, 177, 35];
FPU = [61.5, 180, 27];
F_ARM = [   // [픽업, 볼]
    [[12.0, 206, 20.0], FUP],  [[16.0, 152, 23.0], FUP],
    [[11.9, 208,  9.3], FLO_BALL], [[16.3, 150, 12.0], FLO_BALL],
    [[15.6, 162, 14.0], FTR]];
F_PUSH = [[11.8, 198, 24.4], FPU];
RUP = [53.5, -182, 46];  RLO = [54, -179, 23];  RDRIVE_O = [52, -180, 31];
R_ARM = [
    [[13.3, -160, 47.0], RUP], [[13.3, -198, 45.0], RUP],
    [[12.8, -158, 20.4], RLO], [[9.2, -202, 19.6], RLO]];
R_PULL = [[12.6, -177, 23.75], [53.5, -181, 44]];
R_DRIVE = [[13.2, -180, 17.0], RDRIVE_O];

// ===== 23/24 브레이크 스쿱 =====
SCOOP_F = [[164.2, 59.5, 7, 11, 30, 3], [158, 58.5, 5.5, 8, 28.5, 2.5]];
SCOOP_R = [[-164.2, 48, 7, 10, 29, 3], [-158, 46, 5, 7.5, 27.5, 2.5]];

// ===== 25~28 타이어/림 =====
TIRE_BEAD = 2.6;   // 비드 안쪽 세팅 (단면 반경 23.4)

// ===== 29 기어박스 + 리어 크래시 =====
GEAR_SEC = [
    [-258,   0,  4,  1.8, 15.00, 1.5], [-252, 0,  6,  1.6, 16.30, 2],
    [-230,   0,  9,  1.4, 18.30, 3],   [-208, 0, 12,  4.9, 15.05, 4],
    [-195,   0, 16,  9.35, 14.83, 5],   [-170, 0, 20, 15.1, 15.45, 6],
    [-145,   0, 22, 15.95, 13.60, 7],  [-117.85, 0, 26, 8.6,  9.95, 8]];
GEAR_TOWER = [-200, -158, 8, 11.3, 28, 50];  // y1,y0,x내측,x외측,z0,z1
RAIN_LT = [-258.6, 5, 4];   // y면, w, h

// ===== 30 카메라/안테나 =====
TCAM_Y = -45;  TCAM_Z0 = 84.8;
SIDECAM = [[194, 19.0], [202, 18.5]];  // (y, z) — x는 노우즈 반폭+0.15
ANT = [[4, 70], [-4, 70]];             // (x, y) — chassis 탑
// main file
// 12 프런트 윙 엔드플레이트 + 다이브플레인 (좌우 1부품)
include <../params.scad>
use <../lib.scad>

module fw_endplates()
for (s = [-1, 1]) {
    translate([s * FW_EP_X, 0, 0]) rotate([90, 0, 90])
        linear_extrude(FW_EP_T, center = true) polygon(FW_EP_PTS);
    rod([s * 95.8, 243.5, 21.4], [s * 90, 249, 23.8], 2, 24);  // 다이브플레인
}

fw_endplates();
